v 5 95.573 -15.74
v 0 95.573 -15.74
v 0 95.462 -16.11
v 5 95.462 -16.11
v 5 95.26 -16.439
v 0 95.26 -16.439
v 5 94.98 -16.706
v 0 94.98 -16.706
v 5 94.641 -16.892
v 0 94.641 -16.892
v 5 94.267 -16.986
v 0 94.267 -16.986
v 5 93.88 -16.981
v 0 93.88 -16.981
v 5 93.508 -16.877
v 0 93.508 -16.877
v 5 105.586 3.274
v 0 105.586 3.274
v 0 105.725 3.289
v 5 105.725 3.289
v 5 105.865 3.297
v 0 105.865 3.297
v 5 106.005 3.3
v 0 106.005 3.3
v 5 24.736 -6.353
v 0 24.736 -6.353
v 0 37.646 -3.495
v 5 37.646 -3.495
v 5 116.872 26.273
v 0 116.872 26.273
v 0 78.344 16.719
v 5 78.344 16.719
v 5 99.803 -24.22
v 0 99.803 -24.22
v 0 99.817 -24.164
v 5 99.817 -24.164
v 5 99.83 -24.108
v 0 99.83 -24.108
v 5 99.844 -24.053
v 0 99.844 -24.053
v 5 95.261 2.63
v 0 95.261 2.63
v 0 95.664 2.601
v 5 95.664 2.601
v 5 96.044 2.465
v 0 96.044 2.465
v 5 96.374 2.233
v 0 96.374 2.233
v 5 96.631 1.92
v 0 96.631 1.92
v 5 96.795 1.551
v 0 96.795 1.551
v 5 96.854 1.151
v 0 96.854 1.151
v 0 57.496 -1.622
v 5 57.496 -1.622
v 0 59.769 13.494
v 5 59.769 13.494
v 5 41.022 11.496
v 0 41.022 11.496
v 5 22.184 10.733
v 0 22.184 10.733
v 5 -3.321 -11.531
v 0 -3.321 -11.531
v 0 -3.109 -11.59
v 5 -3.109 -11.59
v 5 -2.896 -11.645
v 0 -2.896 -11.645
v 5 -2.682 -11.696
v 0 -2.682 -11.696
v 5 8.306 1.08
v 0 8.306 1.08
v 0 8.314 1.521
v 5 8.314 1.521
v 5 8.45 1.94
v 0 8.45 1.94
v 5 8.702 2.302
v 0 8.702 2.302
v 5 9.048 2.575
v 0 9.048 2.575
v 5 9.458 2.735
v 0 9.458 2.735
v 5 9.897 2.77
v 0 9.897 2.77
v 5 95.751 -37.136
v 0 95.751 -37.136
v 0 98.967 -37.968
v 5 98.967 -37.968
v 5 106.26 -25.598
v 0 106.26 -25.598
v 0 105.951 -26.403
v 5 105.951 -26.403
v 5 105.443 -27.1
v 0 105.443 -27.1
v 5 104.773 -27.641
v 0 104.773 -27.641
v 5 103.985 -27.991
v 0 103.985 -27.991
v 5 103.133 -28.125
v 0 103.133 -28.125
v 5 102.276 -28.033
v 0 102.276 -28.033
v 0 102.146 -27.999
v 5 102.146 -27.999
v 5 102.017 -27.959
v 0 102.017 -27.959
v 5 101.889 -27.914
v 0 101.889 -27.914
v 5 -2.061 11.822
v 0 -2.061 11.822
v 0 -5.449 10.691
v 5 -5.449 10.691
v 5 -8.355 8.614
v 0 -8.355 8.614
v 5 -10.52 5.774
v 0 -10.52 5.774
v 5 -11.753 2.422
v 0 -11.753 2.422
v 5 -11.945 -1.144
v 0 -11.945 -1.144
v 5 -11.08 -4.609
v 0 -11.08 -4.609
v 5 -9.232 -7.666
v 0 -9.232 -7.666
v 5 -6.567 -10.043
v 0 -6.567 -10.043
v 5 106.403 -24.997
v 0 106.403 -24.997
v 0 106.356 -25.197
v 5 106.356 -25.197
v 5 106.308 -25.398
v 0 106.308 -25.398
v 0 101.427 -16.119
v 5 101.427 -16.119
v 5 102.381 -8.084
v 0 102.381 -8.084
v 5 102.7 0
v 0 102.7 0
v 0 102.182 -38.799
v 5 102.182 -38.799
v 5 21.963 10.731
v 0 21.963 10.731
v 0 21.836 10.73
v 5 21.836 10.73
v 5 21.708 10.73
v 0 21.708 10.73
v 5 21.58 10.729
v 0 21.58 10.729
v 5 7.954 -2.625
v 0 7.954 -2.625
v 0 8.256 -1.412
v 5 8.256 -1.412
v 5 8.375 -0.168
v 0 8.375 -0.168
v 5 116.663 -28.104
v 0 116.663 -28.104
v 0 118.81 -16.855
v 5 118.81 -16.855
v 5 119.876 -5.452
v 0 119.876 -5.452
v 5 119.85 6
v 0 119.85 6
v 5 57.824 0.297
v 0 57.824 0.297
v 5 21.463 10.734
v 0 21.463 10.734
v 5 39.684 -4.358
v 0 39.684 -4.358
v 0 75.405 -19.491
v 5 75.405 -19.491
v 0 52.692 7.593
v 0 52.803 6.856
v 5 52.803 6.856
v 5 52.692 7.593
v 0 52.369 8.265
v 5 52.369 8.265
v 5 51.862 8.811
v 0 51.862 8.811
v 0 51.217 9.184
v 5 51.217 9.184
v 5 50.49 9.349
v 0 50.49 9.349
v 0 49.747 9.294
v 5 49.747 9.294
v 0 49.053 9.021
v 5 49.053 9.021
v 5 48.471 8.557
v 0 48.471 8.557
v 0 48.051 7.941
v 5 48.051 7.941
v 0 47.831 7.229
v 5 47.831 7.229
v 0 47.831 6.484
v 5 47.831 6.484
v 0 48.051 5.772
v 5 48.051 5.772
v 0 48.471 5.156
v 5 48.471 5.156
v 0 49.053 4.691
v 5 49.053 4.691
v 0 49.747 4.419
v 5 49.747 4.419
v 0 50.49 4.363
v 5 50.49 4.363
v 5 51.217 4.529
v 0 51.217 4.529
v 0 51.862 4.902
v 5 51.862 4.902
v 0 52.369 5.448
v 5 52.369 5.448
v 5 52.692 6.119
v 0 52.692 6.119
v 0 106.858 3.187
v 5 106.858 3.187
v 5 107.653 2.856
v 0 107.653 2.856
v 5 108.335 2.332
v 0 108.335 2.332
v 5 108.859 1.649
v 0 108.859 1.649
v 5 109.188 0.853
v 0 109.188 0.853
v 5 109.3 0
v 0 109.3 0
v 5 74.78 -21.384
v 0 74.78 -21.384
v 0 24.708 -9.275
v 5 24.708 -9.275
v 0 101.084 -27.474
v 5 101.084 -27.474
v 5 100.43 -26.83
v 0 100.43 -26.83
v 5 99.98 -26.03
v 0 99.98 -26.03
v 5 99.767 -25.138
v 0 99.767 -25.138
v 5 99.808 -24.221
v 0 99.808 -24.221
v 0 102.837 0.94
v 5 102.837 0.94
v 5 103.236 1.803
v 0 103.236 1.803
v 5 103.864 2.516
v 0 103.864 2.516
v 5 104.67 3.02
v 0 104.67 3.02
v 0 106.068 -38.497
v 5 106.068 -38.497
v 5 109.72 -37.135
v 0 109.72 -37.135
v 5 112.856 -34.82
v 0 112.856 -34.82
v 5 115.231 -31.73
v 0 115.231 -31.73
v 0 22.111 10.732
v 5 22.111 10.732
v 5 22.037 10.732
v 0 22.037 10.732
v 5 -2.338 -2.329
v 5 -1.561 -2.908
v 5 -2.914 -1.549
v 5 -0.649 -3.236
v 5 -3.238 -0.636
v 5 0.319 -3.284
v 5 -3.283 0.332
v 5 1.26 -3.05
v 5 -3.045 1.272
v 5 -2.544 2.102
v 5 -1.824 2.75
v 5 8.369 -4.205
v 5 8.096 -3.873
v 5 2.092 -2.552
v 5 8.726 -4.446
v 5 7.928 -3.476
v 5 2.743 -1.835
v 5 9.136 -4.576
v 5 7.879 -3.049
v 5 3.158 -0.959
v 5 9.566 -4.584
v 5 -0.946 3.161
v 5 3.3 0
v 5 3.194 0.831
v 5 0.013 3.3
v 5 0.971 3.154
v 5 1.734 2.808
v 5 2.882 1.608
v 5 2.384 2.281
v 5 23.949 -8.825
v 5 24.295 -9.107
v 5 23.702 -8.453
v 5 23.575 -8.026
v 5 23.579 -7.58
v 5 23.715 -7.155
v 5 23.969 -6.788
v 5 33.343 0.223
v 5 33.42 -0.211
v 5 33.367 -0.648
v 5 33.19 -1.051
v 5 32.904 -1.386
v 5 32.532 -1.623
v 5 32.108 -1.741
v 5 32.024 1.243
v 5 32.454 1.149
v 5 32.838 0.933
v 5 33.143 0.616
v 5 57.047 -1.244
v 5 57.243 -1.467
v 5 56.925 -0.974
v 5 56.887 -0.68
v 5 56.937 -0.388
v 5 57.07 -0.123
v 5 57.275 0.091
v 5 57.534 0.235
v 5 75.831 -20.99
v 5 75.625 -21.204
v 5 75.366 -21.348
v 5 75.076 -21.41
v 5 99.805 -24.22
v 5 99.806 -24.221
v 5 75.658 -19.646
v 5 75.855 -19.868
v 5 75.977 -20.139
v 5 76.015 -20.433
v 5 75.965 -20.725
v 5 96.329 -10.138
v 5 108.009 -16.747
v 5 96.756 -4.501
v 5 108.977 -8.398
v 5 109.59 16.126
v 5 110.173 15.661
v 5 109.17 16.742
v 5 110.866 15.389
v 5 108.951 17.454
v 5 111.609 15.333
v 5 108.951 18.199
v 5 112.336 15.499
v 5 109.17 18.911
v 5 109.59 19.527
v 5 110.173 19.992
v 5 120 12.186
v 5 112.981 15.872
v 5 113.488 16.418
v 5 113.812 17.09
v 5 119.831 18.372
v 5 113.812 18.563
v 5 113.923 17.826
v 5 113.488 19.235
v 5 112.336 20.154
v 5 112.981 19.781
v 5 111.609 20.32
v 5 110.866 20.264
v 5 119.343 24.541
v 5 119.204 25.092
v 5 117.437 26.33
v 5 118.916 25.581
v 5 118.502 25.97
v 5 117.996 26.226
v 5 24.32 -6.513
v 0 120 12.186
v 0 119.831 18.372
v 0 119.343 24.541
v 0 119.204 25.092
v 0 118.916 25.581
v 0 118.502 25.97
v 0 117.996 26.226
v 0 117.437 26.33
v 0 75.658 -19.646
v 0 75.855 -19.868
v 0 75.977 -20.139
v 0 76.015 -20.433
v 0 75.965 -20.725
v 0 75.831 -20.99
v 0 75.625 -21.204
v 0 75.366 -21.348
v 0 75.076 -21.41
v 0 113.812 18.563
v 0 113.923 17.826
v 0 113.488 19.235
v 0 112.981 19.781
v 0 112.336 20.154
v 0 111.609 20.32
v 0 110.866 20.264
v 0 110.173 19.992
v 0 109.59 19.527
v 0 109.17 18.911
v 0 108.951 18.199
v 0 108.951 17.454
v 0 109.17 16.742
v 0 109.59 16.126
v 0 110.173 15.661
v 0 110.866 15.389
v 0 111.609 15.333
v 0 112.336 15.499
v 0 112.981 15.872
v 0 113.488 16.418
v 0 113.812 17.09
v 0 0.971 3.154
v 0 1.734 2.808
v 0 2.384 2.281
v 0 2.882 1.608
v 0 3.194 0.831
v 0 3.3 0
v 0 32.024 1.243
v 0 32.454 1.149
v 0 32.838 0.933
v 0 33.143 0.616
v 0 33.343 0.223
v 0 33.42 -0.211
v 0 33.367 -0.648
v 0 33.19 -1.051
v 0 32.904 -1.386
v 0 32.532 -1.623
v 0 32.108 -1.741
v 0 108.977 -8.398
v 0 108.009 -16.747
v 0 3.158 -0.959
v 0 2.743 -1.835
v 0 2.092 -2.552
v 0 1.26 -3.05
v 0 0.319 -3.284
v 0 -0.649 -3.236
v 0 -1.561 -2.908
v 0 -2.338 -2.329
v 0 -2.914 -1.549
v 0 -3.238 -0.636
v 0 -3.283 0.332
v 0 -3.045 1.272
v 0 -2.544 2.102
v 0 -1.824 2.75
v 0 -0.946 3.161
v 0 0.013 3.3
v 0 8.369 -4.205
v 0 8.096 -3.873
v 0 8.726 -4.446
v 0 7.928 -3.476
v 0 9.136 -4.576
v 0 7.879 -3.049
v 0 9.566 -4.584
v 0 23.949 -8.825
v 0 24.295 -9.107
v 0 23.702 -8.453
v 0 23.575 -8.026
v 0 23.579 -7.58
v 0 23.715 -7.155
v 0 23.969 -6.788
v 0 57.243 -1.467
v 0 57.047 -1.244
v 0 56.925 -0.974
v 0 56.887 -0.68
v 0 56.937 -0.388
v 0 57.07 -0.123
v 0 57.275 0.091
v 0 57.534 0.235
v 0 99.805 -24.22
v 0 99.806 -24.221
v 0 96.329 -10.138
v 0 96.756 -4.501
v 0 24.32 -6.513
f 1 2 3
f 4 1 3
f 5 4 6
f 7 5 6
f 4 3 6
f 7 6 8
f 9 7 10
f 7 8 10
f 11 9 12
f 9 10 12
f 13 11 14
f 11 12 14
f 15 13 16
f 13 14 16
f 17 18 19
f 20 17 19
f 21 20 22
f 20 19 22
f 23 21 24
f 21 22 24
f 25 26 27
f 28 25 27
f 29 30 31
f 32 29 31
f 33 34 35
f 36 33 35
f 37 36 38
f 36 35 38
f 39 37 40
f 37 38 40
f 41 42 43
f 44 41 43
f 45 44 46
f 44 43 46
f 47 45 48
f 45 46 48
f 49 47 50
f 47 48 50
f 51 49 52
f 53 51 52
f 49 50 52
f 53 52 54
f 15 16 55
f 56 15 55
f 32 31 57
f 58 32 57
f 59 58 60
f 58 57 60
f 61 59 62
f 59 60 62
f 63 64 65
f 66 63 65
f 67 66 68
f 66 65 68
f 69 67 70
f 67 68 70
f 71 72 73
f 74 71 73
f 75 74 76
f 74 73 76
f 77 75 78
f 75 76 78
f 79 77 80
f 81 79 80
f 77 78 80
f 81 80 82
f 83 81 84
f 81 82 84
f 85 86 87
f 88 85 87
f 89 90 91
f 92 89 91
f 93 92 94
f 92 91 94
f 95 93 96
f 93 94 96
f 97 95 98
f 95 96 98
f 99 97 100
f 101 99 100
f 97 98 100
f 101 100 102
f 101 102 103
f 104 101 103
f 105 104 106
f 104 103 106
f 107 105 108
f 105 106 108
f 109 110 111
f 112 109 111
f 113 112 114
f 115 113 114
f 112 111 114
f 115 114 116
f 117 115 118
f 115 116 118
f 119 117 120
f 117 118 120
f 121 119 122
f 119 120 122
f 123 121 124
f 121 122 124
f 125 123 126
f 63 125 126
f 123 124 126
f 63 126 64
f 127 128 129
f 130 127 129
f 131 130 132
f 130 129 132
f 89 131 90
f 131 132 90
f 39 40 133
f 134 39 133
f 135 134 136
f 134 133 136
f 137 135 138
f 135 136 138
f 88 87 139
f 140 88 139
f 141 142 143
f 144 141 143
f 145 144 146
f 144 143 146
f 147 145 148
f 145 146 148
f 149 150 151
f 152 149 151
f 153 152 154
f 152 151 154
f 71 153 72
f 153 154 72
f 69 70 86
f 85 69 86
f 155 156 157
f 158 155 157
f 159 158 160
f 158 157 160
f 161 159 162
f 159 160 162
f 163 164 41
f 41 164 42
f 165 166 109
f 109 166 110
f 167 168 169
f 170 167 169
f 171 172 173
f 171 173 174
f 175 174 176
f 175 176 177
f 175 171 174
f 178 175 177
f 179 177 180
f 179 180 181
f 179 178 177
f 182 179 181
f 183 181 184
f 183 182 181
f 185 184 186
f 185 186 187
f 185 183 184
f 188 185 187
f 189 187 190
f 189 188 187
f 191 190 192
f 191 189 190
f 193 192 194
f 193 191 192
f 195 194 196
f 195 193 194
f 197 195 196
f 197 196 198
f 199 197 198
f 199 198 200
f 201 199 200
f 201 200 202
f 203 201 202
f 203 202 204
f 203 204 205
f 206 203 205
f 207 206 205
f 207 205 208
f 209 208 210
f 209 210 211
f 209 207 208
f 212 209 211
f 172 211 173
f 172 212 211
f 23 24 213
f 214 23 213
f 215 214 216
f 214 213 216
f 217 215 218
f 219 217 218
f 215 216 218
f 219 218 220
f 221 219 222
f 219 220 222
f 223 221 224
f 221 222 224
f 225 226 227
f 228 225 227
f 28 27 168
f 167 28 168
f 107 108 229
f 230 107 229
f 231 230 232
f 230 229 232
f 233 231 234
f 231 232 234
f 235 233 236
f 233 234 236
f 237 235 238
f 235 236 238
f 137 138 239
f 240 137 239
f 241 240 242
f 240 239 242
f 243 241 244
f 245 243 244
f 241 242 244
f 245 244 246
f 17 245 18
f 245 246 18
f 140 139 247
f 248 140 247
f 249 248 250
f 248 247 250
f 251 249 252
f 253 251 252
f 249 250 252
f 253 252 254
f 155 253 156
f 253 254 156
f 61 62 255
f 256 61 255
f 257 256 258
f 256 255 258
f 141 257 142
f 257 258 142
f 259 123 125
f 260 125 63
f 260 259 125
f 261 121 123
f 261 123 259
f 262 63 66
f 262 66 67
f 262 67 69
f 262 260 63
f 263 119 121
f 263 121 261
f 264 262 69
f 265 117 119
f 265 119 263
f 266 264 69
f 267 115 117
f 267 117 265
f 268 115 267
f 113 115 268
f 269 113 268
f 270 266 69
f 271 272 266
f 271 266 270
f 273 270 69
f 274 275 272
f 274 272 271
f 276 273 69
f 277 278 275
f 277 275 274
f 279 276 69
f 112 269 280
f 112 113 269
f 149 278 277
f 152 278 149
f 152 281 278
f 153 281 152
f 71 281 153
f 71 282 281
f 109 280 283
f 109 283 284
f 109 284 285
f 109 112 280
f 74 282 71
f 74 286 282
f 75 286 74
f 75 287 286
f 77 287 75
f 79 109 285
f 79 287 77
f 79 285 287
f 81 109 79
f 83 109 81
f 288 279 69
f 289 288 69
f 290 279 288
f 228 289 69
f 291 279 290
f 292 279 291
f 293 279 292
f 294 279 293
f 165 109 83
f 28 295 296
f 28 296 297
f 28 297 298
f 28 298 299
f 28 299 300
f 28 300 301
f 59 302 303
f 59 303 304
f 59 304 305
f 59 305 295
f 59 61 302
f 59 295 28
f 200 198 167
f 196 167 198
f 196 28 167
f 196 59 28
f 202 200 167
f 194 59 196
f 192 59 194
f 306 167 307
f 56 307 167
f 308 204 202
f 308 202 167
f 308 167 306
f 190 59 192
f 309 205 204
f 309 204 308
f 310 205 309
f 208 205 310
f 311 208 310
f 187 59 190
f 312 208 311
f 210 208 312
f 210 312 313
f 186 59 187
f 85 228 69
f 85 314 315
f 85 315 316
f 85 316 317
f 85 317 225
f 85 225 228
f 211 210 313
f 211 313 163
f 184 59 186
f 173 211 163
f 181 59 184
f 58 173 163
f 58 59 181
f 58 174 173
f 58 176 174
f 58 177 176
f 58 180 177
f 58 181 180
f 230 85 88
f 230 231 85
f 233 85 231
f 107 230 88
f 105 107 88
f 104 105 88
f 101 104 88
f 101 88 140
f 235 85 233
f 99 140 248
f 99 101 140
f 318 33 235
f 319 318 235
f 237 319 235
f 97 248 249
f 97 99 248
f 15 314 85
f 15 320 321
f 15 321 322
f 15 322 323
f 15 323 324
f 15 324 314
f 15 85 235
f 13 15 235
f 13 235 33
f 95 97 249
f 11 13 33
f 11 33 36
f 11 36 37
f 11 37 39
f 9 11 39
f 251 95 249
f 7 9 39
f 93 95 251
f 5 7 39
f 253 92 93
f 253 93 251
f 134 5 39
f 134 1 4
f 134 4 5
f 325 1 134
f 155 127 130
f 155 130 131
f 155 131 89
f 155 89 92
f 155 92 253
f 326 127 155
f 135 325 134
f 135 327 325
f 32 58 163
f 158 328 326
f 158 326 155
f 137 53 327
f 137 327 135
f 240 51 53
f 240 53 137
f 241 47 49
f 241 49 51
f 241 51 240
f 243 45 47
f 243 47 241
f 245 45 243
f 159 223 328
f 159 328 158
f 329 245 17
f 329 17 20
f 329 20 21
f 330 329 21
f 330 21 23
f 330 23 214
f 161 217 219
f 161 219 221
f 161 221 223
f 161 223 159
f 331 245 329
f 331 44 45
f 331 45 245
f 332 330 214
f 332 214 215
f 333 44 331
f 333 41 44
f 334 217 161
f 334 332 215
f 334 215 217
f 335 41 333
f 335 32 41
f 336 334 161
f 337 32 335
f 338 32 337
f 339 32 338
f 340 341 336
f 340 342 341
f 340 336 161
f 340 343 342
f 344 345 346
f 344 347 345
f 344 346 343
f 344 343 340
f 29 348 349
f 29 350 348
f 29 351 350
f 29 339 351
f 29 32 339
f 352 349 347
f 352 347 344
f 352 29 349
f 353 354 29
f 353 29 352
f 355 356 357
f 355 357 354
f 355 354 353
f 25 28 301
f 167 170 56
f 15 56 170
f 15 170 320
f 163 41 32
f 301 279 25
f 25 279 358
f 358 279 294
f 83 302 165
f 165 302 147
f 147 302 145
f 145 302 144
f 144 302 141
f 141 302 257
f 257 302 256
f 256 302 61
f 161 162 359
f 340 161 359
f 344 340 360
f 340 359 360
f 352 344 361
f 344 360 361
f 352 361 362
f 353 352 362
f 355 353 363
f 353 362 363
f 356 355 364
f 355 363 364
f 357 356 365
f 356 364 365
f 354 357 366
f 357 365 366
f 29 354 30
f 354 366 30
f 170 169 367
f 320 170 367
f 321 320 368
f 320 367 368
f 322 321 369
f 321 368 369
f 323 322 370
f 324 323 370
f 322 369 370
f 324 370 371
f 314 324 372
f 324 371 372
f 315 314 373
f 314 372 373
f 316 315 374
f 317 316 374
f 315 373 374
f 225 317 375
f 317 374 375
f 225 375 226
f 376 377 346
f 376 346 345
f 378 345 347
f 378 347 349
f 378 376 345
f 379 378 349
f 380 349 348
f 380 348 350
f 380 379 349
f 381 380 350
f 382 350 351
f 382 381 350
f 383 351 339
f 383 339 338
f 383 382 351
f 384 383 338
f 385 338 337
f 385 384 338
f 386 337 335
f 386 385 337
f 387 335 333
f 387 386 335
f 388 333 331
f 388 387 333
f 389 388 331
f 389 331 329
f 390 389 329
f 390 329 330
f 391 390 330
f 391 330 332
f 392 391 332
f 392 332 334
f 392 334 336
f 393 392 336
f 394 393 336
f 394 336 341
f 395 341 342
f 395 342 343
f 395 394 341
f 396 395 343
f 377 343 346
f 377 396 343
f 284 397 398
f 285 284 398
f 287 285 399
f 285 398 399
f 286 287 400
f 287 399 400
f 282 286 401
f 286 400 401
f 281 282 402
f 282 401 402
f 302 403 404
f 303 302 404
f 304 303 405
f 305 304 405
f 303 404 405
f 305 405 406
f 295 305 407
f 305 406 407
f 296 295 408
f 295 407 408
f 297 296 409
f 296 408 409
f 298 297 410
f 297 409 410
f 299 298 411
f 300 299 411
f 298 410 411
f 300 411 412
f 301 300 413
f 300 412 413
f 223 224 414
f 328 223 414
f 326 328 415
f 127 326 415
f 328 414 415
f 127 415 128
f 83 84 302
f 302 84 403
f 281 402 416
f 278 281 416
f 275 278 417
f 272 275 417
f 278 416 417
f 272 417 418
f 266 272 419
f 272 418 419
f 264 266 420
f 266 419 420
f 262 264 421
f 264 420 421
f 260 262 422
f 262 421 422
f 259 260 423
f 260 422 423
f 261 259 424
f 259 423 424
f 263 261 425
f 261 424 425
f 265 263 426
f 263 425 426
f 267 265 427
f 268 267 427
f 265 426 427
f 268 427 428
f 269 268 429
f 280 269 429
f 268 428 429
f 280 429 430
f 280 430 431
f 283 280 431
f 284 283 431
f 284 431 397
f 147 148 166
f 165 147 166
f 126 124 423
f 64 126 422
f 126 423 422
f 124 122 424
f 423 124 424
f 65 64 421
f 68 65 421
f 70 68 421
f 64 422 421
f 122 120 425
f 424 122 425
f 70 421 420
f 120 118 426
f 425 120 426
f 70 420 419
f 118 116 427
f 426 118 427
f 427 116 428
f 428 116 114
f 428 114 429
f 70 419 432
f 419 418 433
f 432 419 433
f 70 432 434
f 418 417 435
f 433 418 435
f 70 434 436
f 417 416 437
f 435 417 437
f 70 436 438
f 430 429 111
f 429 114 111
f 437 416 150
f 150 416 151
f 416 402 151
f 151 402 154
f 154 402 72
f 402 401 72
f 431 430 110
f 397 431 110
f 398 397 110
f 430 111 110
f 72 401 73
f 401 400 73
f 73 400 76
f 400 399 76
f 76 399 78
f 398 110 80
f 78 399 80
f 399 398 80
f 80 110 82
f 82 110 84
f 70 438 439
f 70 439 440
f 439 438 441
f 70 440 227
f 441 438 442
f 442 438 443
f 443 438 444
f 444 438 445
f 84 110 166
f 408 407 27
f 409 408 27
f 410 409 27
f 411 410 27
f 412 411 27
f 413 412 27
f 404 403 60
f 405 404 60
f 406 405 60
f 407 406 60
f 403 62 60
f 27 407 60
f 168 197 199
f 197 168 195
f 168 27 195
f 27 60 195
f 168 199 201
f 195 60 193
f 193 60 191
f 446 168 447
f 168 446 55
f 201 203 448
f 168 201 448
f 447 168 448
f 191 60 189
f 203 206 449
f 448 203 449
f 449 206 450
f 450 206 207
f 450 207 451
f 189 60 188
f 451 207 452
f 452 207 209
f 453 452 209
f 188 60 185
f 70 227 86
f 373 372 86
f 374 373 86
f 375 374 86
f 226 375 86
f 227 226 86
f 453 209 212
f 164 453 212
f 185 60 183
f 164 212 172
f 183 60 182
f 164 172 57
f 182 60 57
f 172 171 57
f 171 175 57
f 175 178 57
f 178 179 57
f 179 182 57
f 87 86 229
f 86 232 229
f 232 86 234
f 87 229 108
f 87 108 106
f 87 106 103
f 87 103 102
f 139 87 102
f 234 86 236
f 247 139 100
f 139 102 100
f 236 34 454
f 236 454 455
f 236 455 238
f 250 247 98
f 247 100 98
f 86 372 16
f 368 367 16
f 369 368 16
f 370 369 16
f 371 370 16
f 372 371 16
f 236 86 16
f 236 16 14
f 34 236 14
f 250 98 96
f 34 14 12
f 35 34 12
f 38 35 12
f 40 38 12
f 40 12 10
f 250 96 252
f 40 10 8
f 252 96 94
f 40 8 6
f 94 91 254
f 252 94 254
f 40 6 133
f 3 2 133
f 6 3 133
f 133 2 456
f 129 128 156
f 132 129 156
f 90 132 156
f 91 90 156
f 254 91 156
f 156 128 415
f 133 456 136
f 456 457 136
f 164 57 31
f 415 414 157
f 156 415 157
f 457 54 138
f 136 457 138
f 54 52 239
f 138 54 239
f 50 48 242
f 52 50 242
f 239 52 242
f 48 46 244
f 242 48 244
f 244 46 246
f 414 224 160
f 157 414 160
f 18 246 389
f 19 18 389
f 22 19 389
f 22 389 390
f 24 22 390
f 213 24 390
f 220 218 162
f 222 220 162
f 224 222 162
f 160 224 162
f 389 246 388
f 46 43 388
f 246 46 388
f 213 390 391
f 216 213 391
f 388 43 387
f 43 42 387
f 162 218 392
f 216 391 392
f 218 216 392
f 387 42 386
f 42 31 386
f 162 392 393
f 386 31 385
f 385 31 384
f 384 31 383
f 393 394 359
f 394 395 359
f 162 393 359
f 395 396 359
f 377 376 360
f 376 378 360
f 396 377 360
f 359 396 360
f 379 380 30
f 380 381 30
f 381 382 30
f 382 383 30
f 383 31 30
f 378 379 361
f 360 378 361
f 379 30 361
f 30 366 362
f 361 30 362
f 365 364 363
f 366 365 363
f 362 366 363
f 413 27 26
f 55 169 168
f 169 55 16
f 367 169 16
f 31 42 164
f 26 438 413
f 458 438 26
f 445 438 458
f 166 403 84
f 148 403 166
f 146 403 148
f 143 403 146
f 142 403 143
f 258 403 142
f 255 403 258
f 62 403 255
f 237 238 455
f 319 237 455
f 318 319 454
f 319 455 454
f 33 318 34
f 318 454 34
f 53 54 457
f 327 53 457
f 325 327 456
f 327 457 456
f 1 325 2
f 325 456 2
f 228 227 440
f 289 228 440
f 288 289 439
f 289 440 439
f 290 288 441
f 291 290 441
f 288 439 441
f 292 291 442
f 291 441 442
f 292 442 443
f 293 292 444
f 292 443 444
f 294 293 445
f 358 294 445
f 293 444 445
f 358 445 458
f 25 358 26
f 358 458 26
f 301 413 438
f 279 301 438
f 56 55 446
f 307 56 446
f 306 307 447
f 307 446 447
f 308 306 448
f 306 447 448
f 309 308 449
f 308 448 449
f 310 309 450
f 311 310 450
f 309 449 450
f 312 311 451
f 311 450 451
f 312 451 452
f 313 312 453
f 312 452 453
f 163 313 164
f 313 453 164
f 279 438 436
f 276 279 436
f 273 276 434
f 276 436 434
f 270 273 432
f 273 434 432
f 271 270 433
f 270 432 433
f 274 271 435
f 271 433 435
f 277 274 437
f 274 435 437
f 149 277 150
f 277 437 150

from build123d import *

# Parameters (mm, degrees)
F0_R     = 2.5
F1_DEPTH = 5


with BuildPart() as f1:
    # F0 (on Right) → F1 (new body)
    with BuildSketch(Plane.YZ):
        with BuildLine():
            ThreePointArc((102.1820204733, -38.7985140437), (111.3688992979, -36.087326884), (116.6625133499, -28.1044120891))
            ThreePointArc((116.6625133499, -28.1044120891), (119.4793240413, -11.1665181072), (119.8499061326, 6))
            ThreePointArc((119.8499061326, 6), (119.9551556627, 15.2803399129), (119.3428752162, 24.5410579746))
            ThreePointArc((119.3428752162, 24.5410579746), (118.5020303548, 25.9696085801), (116.872434029, 26.2732411356))
            Line((116.872434029, 26.2732411356), (78.344444671, 16.7187866332))
            ThreePointArc((78.344444671, 16.7187866332), (50.4120849121, 12.3407543123), (22.1844688263, 10.7327808001))
            ThreePointArc((22.1844688263, 10.7327808001), (22.0736743793, 10.7245163933), (21.9626931438, 10.7193322557))
            ThreePointArc((21.9626931438, 10.7193322557), (21.897134346, 10.7177196915), (21.8315579223, 10.717182122))
            ThreePointArc((21.8315579223, 10.717182122), (21.6468606164, 10.7214485341), (21.4625573078, 10.7342386694))
            Line((21.4625573078, 10.7342386694), (-2.0614712889, 11.8216046341))
            ThreePointArc((-2.0614712889, 11.8216046341), (-11.9825923491, 0.6461273838), (-3.3207151947, -11.5313854586))
            Line((-3.3207151947, -11.5313854586), (-2.6824780436, -11.696337527))
            Line((-2.6824780436, -11.696337527), (95.7506312441, -37.1363247556))
            Line((95.7506312441, -37.1363247556), (98.966975845, -37.9675873883))
            Line((98.966975845, -37.9675873883), (102.1820204733, -38.7985140437))
        make_face()
        with BuildLine():
            Line((74.7801037599, -21.3838166757), (24.7079464878, -9.2750381753))
            ThreePointArc((24.7079464878, -9.2750381753), (23.5605944603, -7.8024693416), (24.7363828951, -6.3525047896))
            Line((24.7363828951, -6.3525047896), (37.64646566, -3.4952066638))
            Line((37.64646566, -3.4952066638), (39.6840657747, -4.3584005208))
            Line((39.6840657747, -4.3584005208), (75.4052290095, -19.4910501744))
            ThreePointArc((75.4052290095, -19.4910501744), (75.9647072114, -20.7254429281), (74.7801037599, -21.3838166757))
        make_face(mode=Mode.SUBTRACT)
        with BuildLine():
            ThreePointArc((96.8537245562, 1.1511288497), (96.5833908806, -7.3224083499), (95.5731457656, -15.7398496344))
            ThreePointArc((95.5731457656, -15.7398496344), (94.8167325655, -16.8099987725), (93.5079720679, -16.8772748216))
            Line((93.5079720679, -16.8772748216), (57.4962823848, -1.6215486902))
            ThreePointArc((57.4962823848, -1.6215486902), (56.9006424726, -0.5323364967), (57.8241552759, 0.297298489))
            Line((57.8241552759, 0.297298489), (95.2605289234, 2.6303977234))
            ThreePointArc((95.2605289234, 2.6303977234), (96.3744600577, 2.2325362159), (96.8537245562, 1.1511288497))
        make_face(mode=Mode.SUBTRACT)
        with BuildLine():
            ThreePointArc((106.0047579916, 3.2999965699), (108.335133976, 2.3317695671), (109.3, 0))
            ThreePointArc((109.3, 0), (108.5733985389, -12.5820161229), (106.403254717, -24.9967475011))
            ThreePointArc((106.403254717, -24.9967475011), (106.3321059009, -25.2976926752), (106.2601059096, -25.5984353445))
            ThreePointArc((106.2601059096, -25.5984353445), (104.7727098756, -27.6413708088), (102.2762174538, -28.0331077884))
            ThreePointArc((102.2762174538, -28.0331077884), (102.0809432414, -27.9794930887), (101.8893251401, -27.9140021941))
            ThreePointArc((101.8893251401, -27.9140021941), (100.1771054463, -26.4459442797), (99.8077413449, -24.2209812507))
            ThreePointArc((99.8077413449, -24.2209812507), (99.8054980044, -24.2204076148), (99.803254717, -24.2198337711))
            ThreePointArc((99.803254717, -24.2198337711), (99.8234961781, -24.1362716836), (99.8436676753, -24.0526926796))
            ThreePointArc((99.8436676753, -24.0526926796), (101.9834169614, -12.1108490566), (102.7, 0))
            ThreePointArc((102.7, 0), (103.5243491823, 2.1820066519), (105.5855472903, 3.2738706376))
            ThreePointArc((105.5855472903, 3.2738706376), (105.7947365556, 3.2936100131), (106.0047579916, 3.2999965699))
        make_face(mode=Mode.SUBTRACT)
        with BuildLine():
            ThreePointArc((0.9709435511, 3.1539290767), (2.6546293261, 1.960342608), (3.3, 0))
            ThreePointArc((3.3, 0), (-2.6546293261, -1.960342608), (0.9709435511, 3.1539290767))
        make_face(mode=Mode.SUBTRACT)
        with BuildLine():
            ThreePointArc((9.5663779465, -4.5835158726), (8.220643901, -4.0486256327), (7.9543036044, -2.6251894605))
            ThreePointArc((7.9543036044, -2.6251894605), (8.3387505543, -0.792341295), (8.3063784002, 1.0801126827))
            ThreePointArc((8.3063784002, 1.0801126827), (8.7016404445, 2.3016729085), (9.8971035196, 2.769977836))
            Line((9.8971035196, 2.769977836), (32.0235012294, 1.2433501427))
            ThreePointArc((32.0235012294, 1.2433501427), (33.4196537084, -0.210693525), (32.1078987642, -1.7413089889))
            Line((32.1078987642, -1.7413089889), (9.5663779465, -4.5835158726))
        make_face(mode=Mode.SUBTRACT)
        with Locations((50.3031872213, 6.8563437089)):
            Circle(F0_R, mode=Mode.SUBTRACT)
        with Locations((111.4225909114, 17.8264938295)):
            Circle(F0_R, mode=Mode.SUBTRACT)
        with BuildLine():
            ThreePointArc((-3.3207151947, -11.5313854586), (-3.0027295184, -11.618244938), (-2.6824780436, -11.696337527))
            Line((-2.6824780436, -11.696337527), (-3.3207151947, -11.5313854586))
        make_face()
        with BuildLine():
            ThreePointArc((21.9626931438, 10.7193322557), (22.0736743793, 10.7245163933), (22.1844688263, 10.7327808001))
            ThreePointArc((22.1844688263, 10.7327808001), (22.0739250085, 10.7319598925), (21.9633808826, 10.731181571))
            ThreePointArc((21.9633808826, 10.731181571), (21.9630378123, 10.7252568669), (21.9626931438, 10.7193322557))
        make_face()
        with BuildLine():
            ThreePointArc((21.8315579223, 10.717182122), (21.897134346, 10.7177196915), (21.9626931438, 10.7193322557))
            ThreePointArc((21.9626931438, 10.7193322557), (21.9630378123, 10.7252568669), (21.9633808826, 10.731181571))
            ThreePointArc((21.9633808826, 10.731181571), (21.7716697335, 10.7299327404), (21.5799577929, 10.728811993))
            Line((21.5799577929, 10.728811993), (21.8315579223, 10.717182122))
        make_face()
        with BuildLine():
            ThreePointArc((21.4625573078, 10.7342386694), (21.6468606164, 10.7214485341), (21.8315579223, 10.717182122))
            Line((21.8315579223, 10.717182122), (21.5799577929, 10.728811993))
            Line((21.5799577929, 10.728811993), (21.4625573078, 10.7342386694))
        make_face()
    extrude(amount=F1_DEPTH)


solid = f1.part
